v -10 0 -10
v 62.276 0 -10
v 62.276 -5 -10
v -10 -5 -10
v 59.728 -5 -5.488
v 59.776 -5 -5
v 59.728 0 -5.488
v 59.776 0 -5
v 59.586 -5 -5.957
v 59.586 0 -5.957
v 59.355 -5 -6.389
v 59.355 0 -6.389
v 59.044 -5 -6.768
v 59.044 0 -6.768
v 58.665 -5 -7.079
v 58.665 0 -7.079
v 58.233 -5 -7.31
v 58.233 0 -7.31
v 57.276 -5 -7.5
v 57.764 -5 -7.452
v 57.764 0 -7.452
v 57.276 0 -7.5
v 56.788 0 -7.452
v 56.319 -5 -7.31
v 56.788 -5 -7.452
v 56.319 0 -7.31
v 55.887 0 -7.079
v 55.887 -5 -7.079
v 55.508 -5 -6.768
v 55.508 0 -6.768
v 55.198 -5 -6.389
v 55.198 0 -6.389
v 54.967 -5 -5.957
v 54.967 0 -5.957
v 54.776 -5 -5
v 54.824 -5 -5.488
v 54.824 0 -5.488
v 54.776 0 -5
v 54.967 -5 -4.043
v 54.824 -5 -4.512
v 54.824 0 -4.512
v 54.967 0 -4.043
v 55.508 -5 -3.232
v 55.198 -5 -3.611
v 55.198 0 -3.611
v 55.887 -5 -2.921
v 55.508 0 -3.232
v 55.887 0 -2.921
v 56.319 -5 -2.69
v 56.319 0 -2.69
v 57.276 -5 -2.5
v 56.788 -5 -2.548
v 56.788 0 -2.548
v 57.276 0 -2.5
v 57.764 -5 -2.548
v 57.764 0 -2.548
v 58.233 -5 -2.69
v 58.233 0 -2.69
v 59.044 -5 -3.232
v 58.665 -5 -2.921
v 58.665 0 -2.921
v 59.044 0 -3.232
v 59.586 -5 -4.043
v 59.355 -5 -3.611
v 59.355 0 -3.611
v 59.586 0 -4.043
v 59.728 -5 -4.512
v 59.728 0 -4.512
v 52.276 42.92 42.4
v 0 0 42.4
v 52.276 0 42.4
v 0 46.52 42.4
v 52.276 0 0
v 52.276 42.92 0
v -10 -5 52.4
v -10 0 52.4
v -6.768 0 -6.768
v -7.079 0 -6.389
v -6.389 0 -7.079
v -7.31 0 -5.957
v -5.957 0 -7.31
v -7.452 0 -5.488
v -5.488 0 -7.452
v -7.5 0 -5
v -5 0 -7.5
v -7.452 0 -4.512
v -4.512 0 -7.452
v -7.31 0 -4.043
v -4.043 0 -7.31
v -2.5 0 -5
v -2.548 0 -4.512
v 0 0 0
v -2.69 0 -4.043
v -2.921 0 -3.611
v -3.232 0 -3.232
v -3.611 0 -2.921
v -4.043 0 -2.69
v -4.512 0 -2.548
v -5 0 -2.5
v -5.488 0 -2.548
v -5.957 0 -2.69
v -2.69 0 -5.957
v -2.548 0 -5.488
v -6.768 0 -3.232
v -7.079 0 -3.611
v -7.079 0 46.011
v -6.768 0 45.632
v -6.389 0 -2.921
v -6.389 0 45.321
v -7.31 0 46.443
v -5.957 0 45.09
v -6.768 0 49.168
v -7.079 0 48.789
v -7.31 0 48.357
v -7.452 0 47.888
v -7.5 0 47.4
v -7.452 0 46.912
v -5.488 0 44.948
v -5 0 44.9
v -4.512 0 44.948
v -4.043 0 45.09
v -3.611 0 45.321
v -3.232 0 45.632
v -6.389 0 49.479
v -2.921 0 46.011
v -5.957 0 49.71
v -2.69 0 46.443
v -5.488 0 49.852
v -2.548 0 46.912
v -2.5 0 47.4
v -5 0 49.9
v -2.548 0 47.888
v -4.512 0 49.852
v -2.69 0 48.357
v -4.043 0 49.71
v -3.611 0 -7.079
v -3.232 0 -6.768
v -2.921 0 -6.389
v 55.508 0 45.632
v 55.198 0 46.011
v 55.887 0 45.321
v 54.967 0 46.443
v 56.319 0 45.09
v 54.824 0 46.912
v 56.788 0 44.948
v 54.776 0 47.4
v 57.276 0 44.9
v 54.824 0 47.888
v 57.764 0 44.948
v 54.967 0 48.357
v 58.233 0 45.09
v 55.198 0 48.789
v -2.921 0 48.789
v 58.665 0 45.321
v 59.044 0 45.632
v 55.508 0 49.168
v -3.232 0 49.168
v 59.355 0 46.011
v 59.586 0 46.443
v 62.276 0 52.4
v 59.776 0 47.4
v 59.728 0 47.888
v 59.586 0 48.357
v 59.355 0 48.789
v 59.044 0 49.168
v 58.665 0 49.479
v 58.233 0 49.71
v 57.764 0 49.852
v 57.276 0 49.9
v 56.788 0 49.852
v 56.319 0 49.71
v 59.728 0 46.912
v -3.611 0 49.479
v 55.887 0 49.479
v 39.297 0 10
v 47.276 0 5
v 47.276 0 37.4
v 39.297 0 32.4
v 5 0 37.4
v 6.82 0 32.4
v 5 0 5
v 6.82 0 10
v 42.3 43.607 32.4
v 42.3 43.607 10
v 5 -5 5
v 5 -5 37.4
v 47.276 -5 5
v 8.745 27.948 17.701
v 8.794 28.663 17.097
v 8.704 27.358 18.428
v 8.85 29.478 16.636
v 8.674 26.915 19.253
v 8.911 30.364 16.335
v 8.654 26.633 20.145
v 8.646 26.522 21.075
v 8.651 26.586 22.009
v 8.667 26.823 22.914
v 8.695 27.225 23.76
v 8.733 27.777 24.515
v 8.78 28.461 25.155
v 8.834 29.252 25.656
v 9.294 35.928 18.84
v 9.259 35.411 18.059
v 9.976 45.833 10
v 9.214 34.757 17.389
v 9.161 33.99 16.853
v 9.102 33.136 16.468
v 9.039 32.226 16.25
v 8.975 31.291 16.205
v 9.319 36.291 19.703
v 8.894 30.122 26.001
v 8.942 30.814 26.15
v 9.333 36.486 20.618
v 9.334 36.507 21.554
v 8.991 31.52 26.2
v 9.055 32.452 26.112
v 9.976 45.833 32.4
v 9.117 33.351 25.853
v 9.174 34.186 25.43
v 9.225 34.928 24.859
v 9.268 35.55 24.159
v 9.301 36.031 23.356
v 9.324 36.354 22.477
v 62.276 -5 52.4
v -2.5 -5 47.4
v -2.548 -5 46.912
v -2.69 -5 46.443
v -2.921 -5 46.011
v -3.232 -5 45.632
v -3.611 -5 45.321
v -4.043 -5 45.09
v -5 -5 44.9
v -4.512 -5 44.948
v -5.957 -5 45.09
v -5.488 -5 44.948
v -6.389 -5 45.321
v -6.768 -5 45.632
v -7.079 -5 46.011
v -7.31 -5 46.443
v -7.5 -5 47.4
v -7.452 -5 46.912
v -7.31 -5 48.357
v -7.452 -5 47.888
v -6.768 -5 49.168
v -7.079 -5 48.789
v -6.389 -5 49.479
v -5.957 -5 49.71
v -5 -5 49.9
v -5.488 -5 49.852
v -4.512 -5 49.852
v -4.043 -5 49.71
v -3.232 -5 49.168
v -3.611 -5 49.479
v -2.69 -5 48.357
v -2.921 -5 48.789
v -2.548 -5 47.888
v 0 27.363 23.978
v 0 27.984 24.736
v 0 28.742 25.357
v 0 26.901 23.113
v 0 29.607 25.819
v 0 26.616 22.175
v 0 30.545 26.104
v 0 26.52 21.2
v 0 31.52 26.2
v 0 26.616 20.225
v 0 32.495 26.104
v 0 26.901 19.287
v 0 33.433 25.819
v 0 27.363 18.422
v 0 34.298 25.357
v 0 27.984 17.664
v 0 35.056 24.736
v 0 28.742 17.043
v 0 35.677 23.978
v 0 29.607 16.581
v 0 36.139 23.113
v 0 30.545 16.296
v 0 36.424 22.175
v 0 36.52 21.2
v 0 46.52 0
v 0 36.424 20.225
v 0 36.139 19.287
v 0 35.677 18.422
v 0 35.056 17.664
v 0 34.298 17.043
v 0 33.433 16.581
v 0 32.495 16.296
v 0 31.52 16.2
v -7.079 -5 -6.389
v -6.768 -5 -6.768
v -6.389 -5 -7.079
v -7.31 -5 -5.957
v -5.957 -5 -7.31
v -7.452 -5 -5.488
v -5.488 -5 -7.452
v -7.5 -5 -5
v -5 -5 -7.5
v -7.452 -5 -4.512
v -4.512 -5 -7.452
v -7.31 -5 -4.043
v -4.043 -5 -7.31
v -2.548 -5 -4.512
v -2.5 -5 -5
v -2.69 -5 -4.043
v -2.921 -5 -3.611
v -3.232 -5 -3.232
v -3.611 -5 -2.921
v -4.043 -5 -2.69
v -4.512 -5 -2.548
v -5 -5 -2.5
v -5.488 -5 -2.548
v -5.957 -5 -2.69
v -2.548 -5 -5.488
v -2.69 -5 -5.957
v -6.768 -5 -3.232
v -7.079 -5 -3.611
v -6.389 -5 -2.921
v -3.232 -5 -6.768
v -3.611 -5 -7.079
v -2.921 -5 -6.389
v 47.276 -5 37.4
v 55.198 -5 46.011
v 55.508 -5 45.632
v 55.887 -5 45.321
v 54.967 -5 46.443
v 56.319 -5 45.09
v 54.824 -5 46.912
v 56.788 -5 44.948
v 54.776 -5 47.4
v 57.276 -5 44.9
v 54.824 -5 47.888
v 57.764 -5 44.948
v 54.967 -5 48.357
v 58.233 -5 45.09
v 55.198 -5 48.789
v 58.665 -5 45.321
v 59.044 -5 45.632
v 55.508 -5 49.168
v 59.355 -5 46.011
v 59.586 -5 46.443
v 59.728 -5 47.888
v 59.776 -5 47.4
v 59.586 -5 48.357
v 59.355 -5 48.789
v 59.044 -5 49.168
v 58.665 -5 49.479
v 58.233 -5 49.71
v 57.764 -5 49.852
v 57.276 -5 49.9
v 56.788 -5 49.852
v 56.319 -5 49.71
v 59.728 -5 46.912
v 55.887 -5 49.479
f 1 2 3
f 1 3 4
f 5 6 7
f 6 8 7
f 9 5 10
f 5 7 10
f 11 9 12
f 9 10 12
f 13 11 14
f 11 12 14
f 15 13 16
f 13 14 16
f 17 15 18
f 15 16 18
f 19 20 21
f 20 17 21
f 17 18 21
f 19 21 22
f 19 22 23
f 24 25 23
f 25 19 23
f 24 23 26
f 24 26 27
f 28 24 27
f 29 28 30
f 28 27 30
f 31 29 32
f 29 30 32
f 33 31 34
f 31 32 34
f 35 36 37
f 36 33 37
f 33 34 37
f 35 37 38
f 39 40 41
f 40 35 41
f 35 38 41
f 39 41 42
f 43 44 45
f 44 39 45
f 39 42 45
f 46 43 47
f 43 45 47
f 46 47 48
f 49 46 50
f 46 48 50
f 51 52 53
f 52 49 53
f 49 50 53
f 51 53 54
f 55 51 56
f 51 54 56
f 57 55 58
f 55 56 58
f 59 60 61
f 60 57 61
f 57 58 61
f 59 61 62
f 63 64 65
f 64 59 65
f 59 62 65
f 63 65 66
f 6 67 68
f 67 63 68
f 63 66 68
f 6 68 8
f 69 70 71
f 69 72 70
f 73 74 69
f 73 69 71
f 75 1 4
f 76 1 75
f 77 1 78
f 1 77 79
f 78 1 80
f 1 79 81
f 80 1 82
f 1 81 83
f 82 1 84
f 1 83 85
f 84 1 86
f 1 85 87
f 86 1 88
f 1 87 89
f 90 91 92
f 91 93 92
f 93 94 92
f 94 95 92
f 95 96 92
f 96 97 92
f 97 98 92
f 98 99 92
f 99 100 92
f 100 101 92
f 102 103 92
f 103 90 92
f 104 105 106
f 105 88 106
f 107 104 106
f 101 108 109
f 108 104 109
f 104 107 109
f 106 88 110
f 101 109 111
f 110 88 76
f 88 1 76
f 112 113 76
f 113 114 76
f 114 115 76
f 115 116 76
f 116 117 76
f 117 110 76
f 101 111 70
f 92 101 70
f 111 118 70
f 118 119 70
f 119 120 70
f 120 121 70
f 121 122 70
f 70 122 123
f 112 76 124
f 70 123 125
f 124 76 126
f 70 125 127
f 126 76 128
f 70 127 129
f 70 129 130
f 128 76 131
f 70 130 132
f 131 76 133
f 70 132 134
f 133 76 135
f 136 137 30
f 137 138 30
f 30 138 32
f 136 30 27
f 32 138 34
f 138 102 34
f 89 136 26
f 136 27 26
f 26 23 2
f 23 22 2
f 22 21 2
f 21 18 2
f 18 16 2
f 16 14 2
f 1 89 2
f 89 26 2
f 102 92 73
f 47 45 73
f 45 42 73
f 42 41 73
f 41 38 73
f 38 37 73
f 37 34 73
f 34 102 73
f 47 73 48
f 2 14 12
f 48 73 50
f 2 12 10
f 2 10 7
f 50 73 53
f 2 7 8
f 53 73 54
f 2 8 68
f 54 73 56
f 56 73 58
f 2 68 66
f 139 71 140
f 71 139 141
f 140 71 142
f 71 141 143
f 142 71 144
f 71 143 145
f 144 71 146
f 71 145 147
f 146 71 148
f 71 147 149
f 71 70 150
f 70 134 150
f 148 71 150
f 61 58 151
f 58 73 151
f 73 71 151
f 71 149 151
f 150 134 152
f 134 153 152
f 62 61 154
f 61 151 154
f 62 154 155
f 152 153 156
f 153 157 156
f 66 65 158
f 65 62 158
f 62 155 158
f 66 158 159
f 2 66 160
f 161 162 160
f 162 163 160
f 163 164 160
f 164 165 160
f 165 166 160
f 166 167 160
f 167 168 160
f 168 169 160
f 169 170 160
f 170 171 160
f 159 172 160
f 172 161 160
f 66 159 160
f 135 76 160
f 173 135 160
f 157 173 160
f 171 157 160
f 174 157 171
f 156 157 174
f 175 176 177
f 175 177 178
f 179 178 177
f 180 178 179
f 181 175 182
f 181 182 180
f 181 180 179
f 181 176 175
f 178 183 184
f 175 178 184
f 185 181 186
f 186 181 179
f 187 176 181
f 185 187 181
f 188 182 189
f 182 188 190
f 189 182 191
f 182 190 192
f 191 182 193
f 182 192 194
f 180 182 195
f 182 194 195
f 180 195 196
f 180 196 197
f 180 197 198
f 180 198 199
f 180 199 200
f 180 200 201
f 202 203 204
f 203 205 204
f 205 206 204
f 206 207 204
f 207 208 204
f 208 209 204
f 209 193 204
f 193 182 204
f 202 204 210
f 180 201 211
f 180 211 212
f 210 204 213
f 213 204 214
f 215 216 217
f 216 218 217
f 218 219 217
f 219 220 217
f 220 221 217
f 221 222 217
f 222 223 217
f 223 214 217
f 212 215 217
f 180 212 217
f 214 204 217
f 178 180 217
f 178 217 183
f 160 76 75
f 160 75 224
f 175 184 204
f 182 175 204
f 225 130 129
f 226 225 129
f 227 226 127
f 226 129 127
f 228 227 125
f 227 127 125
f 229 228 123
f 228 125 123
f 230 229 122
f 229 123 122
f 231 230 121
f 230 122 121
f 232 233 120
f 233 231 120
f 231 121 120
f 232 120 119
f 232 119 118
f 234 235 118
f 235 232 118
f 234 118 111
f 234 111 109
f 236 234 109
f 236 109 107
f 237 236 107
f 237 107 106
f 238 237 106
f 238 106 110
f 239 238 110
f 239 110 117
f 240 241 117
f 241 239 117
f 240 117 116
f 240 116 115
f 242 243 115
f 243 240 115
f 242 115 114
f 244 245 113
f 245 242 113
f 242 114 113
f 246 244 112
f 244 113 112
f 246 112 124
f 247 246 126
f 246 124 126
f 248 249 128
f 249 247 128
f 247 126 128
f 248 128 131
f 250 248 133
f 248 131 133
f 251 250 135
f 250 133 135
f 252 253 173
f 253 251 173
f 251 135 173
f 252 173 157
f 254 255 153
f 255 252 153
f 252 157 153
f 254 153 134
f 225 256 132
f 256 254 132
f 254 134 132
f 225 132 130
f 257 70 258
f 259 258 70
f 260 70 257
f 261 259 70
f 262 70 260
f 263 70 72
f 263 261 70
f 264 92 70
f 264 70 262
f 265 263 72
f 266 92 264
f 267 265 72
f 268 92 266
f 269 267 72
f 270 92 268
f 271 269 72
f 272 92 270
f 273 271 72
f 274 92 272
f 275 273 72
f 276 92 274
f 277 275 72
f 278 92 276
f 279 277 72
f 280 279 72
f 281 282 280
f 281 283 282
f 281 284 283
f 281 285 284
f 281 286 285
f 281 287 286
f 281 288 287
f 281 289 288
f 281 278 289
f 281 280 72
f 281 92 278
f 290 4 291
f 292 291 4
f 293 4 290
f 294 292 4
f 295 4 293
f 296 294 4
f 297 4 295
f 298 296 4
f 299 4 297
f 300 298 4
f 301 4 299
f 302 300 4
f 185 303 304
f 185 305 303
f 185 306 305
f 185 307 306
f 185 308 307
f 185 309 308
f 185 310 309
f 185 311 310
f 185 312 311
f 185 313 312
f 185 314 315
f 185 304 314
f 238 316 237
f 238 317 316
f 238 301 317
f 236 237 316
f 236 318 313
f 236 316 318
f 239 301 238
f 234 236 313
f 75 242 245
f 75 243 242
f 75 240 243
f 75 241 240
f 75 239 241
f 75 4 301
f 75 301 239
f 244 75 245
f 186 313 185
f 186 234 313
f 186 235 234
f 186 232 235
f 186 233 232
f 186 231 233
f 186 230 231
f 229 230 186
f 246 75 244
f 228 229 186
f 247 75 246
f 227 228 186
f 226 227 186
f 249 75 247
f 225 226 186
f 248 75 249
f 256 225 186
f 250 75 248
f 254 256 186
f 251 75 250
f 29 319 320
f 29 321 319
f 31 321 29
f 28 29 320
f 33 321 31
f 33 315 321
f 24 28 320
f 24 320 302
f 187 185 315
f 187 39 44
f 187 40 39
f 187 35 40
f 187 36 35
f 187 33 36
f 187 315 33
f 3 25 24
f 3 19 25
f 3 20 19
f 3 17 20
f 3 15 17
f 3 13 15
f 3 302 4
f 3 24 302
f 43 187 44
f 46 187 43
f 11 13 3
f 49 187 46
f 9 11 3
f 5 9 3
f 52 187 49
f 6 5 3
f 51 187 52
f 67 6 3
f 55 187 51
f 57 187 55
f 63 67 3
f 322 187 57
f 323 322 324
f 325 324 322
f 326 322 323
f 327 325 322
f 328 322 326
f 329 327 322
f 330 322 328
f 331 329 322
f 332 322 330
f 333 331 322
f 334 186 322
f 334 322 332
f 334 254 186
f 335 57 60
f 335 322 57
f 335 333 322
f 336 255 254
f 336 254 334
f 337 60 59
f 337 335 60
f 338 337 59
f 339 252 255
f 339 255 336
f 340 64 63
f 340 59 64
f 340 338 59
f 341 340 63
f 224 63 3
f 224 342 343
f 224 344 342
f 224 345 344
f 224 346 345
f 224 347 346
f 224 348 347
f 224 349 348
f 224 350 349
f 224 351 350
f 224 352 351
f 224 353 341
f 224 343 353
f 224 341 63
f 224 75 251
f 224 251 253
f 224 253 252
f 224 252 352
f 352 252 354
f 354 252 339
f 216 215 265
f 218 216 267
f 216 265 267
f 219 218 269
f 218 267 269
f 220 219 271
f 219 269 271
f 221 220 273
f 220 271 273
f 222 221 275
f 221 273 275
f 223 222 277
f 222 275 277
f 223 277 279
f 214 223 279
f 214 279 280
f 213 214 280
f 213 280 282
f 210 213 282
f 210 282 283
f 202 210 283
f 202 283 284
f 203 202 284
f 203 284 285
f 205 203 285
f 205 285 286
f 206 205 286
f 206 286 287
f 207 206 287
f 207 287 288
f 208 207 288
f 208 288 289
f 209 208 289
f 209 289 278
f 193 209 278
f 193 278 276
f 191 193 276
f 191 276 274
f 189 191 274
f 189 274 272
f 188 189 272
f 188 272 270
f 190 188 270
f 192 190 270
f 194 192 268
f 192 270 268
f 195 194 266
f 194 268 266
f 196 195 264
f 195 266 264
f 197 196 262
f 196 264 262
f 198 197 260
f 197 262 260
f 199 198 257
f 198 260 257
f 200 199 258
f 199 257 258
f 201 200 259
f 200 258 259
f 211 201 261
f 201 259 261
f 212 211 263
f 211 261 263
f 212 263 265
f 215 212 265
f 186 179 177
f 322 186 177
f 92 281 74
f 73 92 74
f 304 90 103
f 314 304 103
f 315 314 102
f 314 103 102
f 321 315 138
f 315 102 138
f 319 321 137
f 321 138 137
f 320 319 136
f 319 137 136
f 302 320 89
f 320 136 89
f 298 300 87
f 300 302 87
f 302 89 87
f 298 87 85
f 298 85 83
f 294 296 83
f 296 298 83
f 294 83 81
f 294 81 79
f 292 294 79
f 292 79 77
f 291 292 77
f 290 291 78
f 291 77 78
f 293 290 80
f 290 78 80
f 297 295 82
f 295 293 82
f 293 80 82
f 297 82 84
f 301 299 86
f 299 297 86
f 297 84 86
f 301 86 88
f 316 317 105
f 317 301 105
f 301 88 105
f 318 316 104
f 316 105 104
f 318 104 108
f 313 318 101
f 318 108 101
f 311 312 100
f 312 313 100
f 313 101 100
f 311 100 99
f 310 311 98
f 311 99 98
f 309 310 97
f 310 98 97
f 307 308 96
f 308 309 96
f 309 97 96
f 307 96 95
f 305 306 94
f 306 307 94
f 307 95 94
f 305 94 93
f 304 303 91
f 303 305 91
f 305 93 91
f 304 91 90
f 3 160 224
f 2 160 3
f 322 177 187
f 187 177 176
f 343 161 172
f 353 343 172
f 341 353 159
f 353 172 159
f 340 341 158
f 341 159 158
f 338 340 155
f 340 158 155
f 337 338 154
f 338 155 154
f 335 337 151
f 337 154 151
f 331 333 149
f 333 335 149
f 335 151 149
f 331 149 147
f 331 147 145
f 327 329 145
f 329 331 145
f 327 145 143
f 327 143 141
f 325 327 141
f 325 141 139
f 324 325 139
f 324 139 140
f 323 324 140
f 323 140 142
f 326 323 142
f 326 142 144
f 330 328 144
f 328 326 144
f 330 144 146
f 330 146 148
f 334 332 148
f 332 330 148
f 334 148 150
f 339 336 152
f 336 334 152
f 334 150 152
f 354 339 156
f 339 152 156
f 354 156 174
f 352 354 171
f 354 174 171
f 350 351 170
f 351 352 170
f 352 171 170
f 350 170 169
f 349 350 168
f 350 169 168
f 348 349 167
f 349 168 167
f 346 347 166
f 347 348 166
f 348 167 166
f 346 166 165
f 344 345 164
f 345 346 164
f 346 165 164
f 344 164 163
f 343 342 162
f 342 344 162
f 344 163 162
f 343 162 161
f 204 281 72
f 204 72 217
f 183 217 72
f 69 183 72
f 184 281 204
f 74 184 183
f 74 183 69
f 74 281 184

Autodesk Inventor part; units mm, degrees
ref_plane "YZ Plane" through (0, 0, 0) normal (1, 0, 0) x (0, 1, 0)
ref_plane "XZ Plane" through (0, 0, 0) normal (0, 1, 0) x (-1, 0, 0)
ref_plane "XY Plane" through (0, 0, 0) normal (0, 0, 1) x (1, 0, 0)
sketch "Sketch1" plane through (0, 0, 0) normal (0, 0, 1) x (1, 0, 0)
  line L0 (0, 0) -> (0, 46.52)
  line L1 (0, 46.52) -> (52.2762, 42.9195)
  line L2 (52.2762, 42.9195) -> (52.2762, 0)
  line L3 (52.2762, 0) -> (0, 0)
  dimension "d0" = 46.52
  dimension "d1" = 52.4
  dimension "d2" = 86.06
extrude "Extrusion1" add sketch "Sketch1" along normal blind 42.4
sketch "Sketch2" plane through (0, 0, 0) normal (0, -1, 0) x (1, 0, 0)
  line L0 (0, 0) -> (52.2762, 0) projected
  line L1 (52.2762, 0) -> (52.2762, 42.4) projected
  line L2 (0, 42.4) -> (52.2762, 42.4) projected
  line L3 (0, 0) -> (0, 42.4) projected
  line L4 (47.2762, 37.4) -> (47.2762, 5)
  line L5 (47.2762, 5) -> (5, 5)
  line L6 (5, 5) -> (5, 37.4)
  line L7 (5, 37.4) -> (47.2762, 37.4)
  line L8 (62.2762, 52.4) -> (62.2762, -10)
  line L9 (62.2762, -10) -> (-10, -10)
  line L10 (-10, -10) -> (-10, 52.4)
  line L11 (-10, 52.4) -> (62.2762, 52.4)
  line L12 (57.2762, 47.4) -> (57.2762, -5) construction
  line L13 (57.2762, -5) -> (-5, -5) construction
  line L14 (-5, -5) -> (-5, 47.4) construction
  line L15 (-5, 47.4) -> (57.2762, 47.4) construction
  circle A0 centre (57.2762, 47.4) radius 2.5
  circle A1 centre (-5, 47.4) radius 2.5
  circle A2 centre (-5, -5) radius 2.5
  circle A3 centre (57.2762, -5) radius 2.5
  dimension "d5" = 5
  dimension "d6" = 10
  dimension "d7" = 5
  dimension "d8" = 5
  dimension "d9" = 5
  dimension "d10" = 5
  dimension "d11" = 5
extrude "Extrusion2" add sketch "Sketch2" along normal blind 5 contours L3 L2 L1 L0 | L8 L9 L10 L11
sketch "Sketch3" plane through (0, 46.52, 42.4) normal (0.0687, 0.9976, 0) x (0.9976, -0.0687, 0)
  line L0 (42.4, 32.4) -> (10, 32.4)
  line L1 (10, 32.4) -> (10, 10)
  line L2 (10, 10) -> (42.4, 10)
  line L3 (42.4, 10) -> (42.4, 32.4)
  line L4 (42.4, 32.4) -> (10, 10) construction
  line L5 (10, 32.4) -> (42.4, 10) construction
  line L6 (52.4, 0) -> (0, 0) projected
  line L7 (0, 42.4) -> (0, 0) projected
  point P0 (3.1965, 42.4)
  point P1 (26.2, 21.2)
  dimension "d14" = 32.4
  dimension "d15" = 22.4
  dimension "d16" = 21.2
  dimension "d17" = 26.2
extrude "Extrusion3" cut sketch "Sketch3" against normal through all
sketch "Sketch4" plane through (0, 46.52, 0) normal (-1, 0, 0) x (0, 0, 1)
  circle A0 centre (21.2, -15) radius 5
  line L0 (0, 0) -> (42.4, 0) projected
  line L1 (0, 0) -> (0, -46.52) projected
  dimension "d20" = 10
  dimension "d21" = 15
  dimension "d22" = 21.2
extrude "Extrusion4" cut sketch "Sketch4" against normal blind 10
properties part number "sort support V3_3DPrint"
